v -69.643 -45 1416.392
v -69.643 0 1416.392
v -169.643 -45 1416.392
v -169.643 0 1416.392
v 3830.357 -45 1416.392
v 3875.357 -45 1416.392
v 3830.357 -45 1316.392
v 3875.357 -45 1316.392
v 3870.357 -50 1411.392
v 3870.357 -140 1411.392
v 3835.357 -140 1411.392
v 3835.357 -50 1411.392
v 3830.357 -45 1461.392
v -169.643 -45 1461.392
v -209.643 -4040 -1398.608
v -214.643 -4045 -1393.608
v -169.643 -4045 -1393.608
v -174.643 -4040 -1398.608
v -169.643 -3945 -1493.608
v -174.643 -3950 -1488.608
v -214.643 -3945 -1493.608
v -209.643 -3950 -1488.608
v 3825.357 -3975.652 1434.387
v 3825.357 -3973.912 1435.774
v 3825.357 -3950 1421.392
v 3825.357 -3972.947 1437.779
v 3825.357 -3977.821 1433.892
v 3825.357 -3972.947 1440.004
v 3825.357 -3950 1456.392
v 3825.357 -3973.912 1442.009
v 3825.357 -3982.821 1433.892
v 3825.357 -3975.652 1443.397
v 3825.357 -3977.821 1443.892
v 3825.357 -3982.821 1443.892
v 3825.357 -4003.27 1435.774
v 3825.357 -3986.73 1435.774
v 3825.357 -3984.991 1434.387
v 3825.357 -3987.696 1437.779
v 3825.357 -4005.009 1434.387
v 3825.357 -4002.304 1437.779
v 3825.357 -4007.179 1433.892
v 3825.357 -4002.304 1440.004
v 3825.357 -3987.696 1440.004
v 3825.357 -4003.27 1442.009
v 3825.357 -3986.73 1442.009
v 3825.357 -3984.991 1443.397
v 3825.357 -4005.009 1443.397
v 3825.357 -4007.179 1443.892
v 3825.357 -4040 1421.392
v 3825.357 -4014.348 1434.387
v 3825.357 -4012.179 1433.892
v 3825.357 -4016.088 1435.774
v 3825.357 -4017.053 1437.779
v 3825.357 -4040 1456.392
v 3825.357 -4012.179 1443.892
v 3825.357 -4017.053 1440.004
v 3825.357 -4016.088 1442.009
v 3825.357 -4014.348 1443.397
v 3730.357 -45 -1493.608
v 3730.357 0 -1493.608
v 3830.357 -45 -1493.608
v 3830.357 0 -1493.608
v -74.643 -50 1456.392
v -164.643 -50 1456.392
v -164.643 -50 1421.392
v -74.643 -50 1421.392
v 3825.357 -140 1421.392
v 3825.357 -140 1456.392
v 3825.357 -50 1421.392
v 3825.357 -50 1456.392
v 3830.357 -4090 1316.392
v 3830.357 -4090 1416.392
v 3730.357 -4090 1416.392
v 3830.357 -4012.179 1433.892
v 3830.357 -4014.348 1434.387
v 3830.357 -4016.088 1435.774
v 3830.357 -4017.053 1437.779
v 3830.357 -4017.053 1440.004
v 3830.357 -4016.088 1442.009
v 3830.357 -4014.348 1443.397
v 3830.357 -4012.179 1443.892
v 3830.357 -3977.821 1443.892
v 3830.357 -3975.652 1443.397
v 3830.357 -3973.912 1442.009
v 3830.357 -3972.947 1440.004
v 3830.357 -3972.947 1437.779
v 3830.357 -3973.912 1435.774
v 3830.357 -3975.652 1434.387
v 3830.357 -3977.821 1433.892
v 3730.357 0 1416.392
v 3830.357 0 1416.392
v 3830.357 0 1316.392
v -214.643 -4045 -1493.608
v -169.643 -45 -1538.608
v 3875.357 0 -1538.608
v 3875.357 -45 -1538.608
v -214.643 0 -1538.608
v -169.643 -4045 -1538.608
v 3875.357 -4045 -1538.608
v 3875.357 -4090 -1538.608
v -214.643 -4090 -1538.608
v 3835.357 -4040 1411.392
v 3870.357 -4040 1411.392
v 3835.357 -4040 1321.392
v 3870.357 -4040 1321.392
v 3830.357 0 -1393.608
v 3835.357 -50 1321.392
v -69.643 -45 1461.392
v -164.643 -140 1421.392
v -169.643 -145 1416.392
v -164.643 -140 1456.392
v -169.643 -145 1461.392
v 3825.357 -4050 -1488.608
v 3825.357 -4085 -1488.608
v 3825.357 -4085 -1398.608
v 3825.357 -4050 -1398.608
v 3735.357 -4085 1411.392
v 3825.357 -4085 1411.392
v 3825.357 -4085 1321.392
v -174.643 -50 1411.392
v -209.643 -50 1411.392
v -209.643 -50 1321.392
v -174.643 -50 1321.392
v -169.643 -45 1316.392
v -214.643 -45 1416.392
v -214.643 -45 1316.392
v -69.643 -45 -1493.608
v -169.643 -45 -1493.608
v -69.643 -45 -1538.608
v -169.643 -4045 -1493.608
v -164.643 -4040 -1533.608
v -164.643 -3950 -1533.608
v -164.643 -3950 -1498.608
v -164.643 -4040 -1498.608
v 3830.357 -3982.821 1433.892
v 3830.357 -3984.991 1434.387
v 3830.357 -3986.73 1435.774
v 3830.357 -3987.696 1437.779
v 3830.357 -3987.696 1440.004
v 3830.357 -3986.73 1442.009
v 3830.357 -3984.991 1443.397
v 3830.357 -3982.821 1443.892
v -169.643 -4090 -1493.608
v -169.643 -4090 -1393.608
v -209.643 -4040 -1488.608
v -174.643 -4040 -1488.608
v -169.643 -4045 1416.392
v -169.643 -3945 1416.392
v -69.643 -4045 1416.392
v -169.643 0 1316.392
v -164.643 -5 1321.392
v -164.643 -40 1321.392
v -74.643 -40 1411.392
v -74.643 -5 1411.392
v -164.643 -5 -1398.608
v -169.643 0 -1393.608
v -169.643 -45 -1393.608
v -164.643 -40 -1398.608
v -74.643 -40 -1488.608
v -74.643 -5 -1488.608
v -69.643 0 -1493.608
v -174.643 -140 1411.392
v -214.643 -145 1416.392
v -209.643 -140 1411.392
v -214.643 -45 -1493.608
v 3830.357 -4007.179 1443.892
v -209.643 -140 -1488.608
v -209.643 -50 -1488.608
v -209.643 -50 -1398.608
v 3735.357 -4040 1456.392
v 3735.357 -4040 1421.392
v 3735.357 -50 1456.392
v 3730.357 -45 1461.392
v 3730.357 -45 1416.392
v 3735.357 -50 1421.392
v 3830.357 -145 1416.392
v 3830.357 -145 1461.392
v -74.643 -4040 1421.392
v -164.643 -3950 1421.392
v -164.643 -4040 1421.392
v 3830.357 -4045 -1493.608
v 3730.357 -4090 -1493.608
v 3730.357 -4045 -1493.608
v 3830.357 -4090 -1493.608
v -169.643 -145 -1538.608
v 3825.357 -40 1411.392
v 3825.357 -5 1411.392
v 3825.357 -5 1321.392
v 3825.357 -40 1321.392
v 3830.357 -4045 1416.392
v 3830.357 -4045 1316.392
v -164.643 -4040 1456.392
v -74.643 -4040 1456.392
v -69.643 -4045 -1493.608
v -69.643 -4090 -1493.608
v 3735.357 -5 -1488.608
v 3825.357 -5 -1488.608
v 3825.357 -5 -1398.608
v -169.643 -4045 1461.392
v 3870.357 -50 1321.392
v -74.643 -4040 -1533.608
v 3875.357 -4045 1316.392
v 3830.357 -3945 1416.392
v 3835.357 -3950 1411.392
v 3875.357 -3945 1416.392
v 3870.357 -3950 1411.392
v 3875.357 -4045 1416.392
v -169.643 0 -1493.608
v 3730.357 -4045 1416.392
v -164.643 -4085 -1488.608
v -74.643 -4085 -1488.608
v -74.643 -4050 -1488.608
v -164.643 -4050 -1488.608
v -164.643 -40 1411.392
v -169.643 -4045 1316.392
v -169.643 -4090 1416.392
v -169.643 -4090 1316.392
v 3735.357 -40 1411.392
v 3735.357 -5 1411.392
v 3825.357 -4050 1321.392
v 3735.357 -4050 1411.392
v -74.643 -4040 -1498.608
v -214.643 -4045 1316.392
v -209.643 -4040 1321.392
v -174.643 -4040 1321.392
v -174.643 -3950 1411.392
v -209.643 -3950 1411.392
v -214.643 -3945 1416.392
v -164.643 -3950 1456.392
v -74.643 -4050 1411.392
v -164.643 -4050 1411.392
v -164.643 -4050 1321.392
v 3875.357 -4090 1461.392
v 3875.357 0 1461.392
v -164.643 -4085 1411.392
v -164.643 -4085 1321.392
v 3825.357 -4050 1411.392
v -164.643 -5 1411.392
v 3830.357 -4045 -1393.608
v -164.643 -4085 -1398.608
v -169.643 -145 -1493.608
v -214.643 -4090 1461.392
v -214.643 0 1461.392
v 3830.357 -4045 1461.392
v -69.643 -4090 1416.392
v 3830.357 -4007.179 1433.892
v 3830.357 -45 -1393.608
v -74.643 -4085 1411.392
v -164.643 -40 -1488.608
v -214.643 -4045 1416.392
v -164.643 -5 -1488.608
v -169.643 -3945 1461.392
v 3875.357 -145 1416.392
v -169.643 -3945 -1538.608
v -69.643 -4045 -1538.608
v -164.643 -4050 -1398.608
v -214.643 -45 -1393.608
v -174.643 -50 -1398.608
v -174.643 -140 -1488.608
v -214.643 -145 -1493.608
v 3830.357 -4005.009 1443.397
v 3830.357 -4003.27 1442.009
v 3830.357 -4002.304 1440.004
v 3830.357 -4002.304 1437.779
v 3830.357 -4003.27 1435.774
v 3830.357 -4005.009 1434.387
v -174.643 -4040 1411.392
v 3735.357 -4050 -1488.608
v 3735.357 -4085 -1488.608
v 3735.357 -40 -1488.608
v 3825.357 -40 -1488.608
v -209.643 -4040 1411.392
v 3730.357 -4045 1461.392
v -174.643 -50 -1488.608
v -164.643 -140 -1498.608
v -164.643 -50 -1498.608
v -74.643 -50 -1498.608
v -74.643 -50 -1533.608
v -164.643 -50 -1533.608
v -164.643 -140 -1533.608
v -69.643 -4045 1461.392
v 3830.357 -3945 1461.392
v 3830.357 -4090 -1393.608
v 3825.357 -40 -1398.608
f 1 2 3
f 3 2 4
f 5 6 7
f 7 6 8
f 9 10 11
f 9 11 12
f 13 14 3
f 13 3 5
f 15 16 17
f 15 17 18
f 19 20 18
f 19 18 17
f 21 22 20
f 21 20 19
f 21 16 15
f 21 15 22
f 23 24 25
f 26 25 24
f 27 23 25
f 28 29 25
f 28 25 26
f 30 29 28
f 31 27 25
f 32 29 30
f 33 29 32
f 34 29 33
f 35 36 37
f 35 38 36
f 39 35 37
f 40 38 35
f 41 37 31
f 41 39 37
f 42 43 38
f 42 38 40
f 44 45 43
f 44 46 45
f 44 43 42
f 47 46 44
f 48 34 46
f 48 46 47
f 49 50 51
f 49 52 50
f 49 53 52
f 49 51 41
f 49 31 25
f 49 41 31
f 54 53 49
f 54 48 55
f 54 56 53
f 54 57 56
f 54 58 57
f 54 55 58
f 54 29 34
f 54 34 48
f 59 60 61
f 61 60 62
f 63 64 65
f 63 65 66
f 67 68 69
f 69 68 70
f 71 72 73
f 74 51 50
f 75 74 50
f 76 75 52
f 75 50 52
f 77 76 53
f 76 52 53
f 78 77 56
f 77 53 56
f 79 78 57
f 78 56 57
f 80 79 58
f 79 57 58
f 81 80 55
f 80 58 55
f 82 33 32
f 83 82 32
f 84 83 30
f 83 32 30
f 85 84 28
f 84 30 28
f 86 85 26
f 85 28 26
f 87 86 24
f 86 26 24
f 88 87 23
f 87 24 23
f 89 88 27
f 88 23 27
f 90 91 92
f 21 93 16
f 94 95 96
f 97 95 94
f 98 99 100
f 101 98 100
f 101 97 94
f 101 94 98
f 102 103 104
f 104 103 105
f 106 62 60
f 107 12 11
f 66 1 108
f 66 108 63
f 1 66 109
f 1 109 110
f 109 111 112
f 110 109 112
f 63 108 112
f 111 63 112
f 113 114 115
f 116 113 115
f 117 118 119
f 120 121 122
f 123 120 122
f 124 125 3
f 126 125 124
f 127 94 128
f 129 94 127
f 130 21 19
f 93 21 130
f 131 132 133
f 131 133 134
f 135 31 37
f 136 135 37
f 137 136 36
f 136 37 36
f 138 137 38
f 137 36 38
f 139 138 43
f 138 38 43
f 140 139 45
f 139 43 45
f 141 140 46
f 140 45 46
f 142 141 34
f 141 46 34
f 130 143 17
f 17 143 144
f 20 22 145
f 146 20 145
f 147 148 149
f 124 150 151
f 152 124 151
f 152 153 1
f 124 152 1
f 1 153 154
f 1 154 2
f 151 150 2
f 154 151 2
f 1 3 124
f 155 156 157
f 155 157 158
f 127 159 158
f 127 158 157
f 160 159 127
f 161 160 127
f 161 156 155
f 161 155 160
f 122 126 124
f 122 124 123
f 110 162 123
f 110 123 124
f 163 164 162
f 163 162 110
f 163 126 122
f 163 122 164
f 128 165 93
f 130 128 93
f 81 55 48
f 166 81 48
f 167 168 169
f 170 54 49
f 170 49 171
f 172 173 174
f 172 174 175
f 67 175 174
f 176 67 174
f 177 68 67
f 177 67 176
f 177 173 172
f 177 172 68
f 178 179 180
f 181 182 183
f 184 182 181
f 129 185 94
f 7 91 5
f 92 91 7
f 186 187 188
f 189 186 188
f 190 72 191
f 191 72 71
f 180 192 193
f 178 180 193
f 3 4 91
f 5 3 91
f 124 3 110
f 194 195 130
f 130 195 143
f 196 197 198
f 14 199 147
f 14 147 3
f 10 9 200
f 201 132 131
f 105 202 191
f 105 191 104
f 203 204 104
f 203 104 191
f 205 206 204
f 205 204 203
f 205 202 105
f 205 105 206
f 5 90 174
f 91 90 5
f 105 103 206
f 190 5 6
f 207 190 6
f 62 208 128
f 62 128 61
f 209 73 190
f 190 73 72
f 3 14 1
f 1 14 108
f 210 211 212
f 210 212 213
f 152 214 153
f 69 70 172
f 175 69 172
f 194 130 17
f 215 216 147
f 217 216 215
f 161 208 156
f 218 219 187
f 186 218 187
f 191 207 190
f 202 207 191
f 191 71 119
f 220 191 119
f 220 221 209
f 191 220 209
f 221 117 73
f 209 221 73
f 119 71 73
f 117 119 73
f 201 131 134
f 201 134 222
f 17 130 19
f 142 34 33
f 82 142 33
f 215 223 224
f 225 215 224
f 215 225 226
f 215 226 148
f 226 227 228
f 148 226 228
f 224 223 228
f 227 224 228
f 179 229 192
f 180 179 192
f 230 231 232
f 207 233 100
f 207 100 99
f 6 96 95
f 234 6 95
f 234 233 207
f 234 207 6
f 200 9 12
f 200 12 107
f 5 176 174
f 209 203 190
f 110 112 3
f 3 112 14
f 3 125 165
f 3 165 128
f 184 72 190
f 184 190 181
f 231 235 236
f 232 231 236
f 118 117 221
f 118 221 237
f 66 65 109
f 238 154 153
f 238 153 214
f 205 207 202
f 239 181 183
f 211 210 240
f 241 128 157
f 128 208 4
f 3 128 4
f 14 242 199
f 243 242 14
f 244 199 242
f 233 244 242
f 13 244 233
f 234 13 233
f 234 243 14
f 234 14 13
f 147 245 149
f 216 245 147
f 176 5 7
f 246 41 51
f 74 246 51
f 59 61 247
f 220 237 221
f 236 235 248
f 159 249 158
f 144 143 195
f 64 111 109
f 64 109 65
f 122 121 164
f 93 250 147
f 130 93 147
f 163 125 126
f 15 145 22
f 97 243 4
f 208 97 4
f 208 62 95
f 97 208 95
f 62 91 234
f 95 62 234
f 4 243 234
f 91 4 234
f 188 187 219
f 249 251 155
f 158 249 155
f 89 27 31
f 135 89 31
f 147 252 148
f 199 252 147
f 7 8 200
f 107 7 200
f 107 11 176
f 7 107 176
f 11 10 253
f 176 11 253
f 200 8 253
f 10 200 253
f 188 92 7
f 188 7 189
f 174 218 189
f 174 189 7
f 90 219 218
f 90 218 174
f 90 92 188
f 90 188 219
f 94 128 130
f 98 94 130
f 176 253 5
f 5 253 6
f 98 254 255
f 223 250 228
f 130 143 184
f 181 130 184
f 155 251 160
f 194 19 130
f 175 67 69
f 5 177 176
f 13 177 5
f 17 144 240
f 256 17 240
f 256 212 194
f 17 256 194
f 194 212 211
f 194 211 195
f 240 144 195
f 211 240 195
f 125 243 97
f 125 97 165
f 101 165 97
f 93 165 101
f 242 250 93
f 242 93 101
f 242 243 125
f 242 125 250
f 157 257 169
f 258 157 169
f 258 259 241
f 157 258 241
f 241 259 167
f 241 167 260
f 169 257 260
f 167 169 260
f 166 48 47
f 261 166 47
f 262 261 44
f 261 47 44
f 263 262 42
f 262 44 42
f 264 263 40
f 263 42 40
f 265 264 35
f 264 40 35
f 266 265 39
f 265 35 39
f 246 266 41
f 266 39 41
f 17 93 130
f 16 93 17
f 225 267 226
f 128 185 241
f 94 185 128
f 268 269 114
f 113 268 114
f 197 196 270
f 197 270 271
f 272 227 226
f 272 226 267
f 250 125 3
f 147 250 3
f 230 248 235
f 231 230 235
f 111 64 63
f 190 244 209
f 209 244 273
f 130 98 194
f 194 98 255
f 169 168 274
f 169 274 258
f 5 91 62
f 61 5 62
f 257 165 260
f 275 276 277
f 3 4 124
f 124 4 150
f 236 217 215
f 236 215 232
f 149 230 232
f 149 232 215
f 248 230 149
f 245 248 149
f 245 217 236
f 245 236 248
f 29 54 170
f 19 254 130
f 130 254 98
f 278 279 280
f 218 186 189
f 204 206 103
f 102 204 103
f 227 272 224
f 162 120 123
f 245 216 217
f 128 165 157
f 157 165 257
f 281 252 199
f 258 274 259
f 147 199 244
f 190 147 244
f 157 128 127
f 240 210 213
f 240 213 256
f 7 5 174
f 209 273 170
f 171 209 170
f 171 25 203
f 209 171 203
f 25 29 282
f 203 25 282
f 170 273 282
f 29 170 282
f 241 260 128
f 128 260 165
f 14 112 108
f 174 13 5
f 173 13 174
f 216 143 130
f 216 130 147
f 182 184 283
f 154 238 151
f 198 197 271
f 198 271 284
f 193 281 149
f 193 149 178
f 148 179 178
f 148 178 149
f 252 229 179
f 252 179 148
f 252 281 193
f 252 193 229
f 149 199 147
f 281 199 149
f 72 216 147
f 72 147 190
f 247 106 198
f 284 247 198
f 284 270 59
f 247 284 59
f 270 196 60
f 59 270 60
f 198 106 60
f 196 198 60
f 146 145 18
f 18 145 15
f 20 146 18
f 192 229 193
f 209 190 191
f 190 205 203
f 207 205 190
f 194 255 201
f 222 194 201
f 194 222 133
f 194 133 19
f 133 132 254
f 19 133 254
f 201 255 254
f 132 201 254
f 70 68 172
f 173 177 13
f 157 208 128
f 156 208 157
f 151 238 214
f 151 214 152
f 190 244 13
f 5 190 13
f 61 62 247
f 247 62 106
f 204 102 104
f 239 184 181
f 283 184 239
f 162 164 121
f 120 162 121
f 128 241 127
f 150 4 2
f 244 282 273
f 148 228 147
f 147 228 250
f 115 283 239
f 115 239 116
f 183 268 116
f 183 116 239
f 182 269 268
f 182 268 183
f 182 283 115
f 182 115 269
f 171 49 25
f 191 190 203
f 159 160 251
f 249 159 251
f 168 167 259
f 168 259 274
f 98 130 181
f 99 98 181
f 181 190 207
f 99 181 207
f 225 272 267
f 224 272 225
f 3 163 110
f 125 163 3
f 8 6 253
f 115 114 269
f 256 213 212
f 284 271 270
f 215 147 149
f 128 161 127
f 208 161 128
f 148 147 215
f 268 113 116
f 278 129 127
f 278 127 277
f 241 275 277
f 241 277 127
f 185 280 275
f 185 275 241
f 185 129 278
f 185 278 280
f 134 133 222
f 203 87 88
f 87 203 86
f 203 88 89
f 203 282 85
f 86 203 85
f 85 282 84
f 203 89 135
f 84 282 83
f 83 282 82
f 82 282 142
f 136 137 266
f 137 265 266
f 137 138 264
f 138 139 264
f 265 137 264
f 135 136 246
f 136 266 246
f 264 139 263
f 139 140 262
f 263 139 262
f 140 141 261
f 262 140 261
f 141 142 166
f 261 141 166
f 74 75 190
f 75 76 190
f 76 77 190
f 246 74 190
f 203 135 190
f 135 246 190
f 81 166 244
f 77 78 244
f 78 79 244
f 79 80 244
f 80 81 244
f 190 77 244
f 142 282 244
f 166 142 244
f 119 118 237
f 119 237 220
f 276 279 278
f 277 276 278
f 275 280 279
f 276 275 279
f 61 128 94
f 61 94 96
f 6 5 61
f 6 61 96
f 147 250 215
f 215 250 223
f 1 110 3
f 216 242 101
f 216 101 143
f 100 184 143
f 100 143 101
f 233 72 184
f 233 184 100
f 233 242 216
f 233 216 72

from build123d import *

# Parameters (mm, degrees)
F0_W      = 4000
F0_H      = 45
F1_DEPTH  = 45
F4_W      = 45
F4_H      = 4000
F5_DEPTH  = 45
F6_W      = 4000
F6_H      = 45
F7_DEPTH  = 45
F9_DEPTH  = 45
F14_DEPTH = 45
F18_DEPTH = 45
F23_T     = -5
F23_2_T   = -5
F23_3_T   = -5
F23_4_T   = -5
F23_5_T   = -5
F23_6_T   = -5
F23_7_T   = -5
F23_8_T   = -5
F23_9_T   = -5
F23_10_T  = -5
F23_11_T  = -5
F23_12_T  = -5
F23_13_T  = -5
F23_14_T  = -5
F23_15_T  = -5
F23_16_T  = -5
F23_17_T  = -5
F23_18_T  = -5
F23_19_T  = -5
F23_20_T  = -5
F25_DEPTH = 25


with BuildPart() as f1:
    # F0 (on Front) → F1 (new body)
    with BuildSketch(Plane.XZ):
        Polygon((-169.6427954237, 1461.3917125762), (-214.6427954237, 1461.3917125762), (-214.6427954237, -1538.6082874238), (-169.6427954237, -1538.6082874238), (-169.6427954237, -1493.6082874238), (-169.6427954237, 1416.3917125762), align=None)
        Polygon((3875.3572045763, 1461.3917125762), (3830.3572045763, 1461.3917125762), (3830.3572045763, 1416.3917125762), (3830.3572045763, -1493.6082874238), (3830.3572045763, -1538.6082874238), (3875.3572045763, -1538.6082874238), align=None)
        with Locations((1830.3572045763, 1438.8917125762)):
            Rectangle(F0_W, F0_H)
        with Locations((1830.3572045763, -1516.1082874238)):
            Rectangle(F0_W, F0_H)
    extrude(amount=F1_DEPTH)


with BuildPart() as f3_1:
    # F3: instance of F1
    add(f1.part.mirror(Plane(origin=(1830.3572045763, -2045, -38.6082874238), x_dir=(1, 0, 0), z_dir=(0, -1, 0))))


with BuildPart() as f1_1:
    add(f1.part)

    add(f3_1.part)  # F5 merges F3_1
    # F4 (on face) → F5 (join)
    with BuildSketch(Plane.XY.offset(1461.3917125762)):
        with Locations((3852.8572045763, -2045)):
            Rectangle(F4_W, F4_H)
        with Locations((-192.1427954237, -2045)):
            Rectangle(F4_W, F4_H)
    extrude(amount=-F5_DEPTH)

    # F6 (on face) → F7 (join)
    with BuildSketch(Plane(origin=(-214.6427954237, 0, 0), x_dir=(0, -1, 0), z_dir=(-1, 0, 0))):
        with Locations((2045, -1516.1082874238)):
            Rectangle(F6_W, F6_H)
    extrude(amount=-F7_DEPTH)


with BuildPart() as f9:
    # F8 (on face) → F9 (new body)
    with BuildSketch(Plane.YZ.offset(3875.3572045763)):
        Polygon((-4045, 1316.3917125762), (-3945, 1416.3917125762), (-4045, 1416.3917125762), align=None)
    extrude(amount=-F9_DEPTH)


with BuildPart() as f10_1:
    # F10: instance of F9
    add(f9.part.mirror(Plane(origin=(1830.3572045763, -2045, -38.6082874238), x_dir=(1, 0, 0), z_dir=(0, -1, 0))))


with BuildPart() as f12_1:
    # F12: instance of F9
    add(f9.part.mirror(Plane(origin=(1830.3572045763, -2045, 1438.8917125762), x_dir=(0, -1, 0), z_dir=(-1, 0, 0))))


with BuildPart() as f12_2:
    # F12: instance of F10_1
    add(f10_1.part.mirror(Plane(origin=(1830.3572045763, -2045, 1438.8917125762), x_dir=(0, -1, 0), z_dir=(-1, 0, 0))))


with BuildPart() as f14:
    # F13 (on face) → F14 (new body)
    with BuildSketch(Plane(origin=(0, 0, 0), x_dir=(-1, 0, 0), z_dir=(0, 1, 0))):
        Polygon((-3730.3572045763, 1416.3917125762), (-3830.3572045763, 1416.3917125762), (-3830.3572045763, 1316.3917125762), align=None)
    extrude(amount=-F14_DEPTH)


with BuildPart() as f15_1:
    # F15: instance of F14
    add(f14.part.mirror(Plane(origin=(1830.3572045763, -2045, 1438.8917125762), x_dir=(0, -1, 0), z_dir=(-1, 0, 0))))


with BuildPart() as f16_1:
    # F16: instance of F14
    add(f14.part.mirror(Plane(origin=(1830.3572045763, -2045, -38.6082874238), x_dir=(1, 0, 0), z_dir=(0, -1, 0))))


with BuildPart() as f16_2:
    # F16: instance of F15_1
    add(f15_1.part.mirror(Plane(origin=(1830.3572045763, -2045, -38.6082874238), x_dir=(1, 0, 0), z_dir=(0, -1, 0))))


with BuildPart() as f18:
    # F17 (on face) → F18 (new body)
    with BuildSketch(Plane.XY.offset(1461.3917125762)):
        Polygon((-169.6427954237, -3945), (-169.6427954237, -4045), (-69.6427954237, -4045), align=None)
    extrude(amount=-F18_DEPTH)


with BuildPart() as f19_1:
    # F19: instance of F18
    add(f18.part.mirror(Plane(origin=(1830.3572045763, -2045, 1438.8917125762), x_dir=(0, -1, 0), z_dir=(-1, 0, 0))))


with BuildPart() as f20_1:
    # F20: instance of F18
    add(f18.part.mirror(Plane(origin=(1830.3572045763, -2045, -38.6082874238), x_dir=(1, 0, 0), z_dir=(0, -1, 0))))


with BuildPart() as f20_2:
    # F20: instance of F19_1
    add(f19_1.part.mirror(Plane(origin=(1830.3572045763, -2045, -38.6082874238), x_dir=(1, 0, 0), z_dir=(0, -1, 0))))

    # F23#7
    f23_7_openings = [f20_2.faces().sort_by_distance(p)[0] for p in [
        (3780.357205, -95, 1438.891713),
    ]]
    offset(amount=F23_7_T, openings=f23_7_openings)


with BuildPart() as f22_1:
    # F22: instance of F14
    add(f14.part.mirror(Plane(origin=(1830.3572045763, -22.5, -38.6082874238), x_dir=(1, 0, 0), z_dir=(0, 0, -1))))

    # F23#16
    f23_16_openings = [f22_1.faces().sort_by_distance(p)[0] for p in [
        (3780.357205, -22.5, -1443.608287),
    ]]
    offset(amount=F23_16_T, openings=f23_16_openings)


with BuildPart() as f22_2:
    # F22: instance of F15_1
    add(f15_1.part.mirror(Plane(origin=(1830.3572045763, -22.5, -38.6082874238), x_dir=(1, 0, 0), z_dir=(0, 0, -1))))

    # F23#2
    f23_2_openings = [f22_2.faces().sort_by_distance(p)[0] for p in [
        (-119.642795, -22.5, -1443.608287),
    ]]
    offset(amount=F23_2_T, openings=f23_2_openings)


with BuildPart() as f22_3:
    # F22: instance of F16_1
    add(f16_1.part.mirror(Plane(origin=(1830.3572045763, -22.5, -38.6082874238), x_dir=(1, 0, 0), z_dir=(0, 0, -1))))

    # F23#17
    f23_17_openings = [f22_3.faces().sort_by_distance(p)[0] for p in [
        (3780.357205, -4067.5, -1443.608287),
    ]]
    offset(amount=F23_17_T, openings=f23_17_openings)


with BuildPart() as f22_4:
    # F22: instance of F16_2
    add(f16_2.part.mirror(Plane(origin=(1830.3572045763, -22.5, -38.6082874238), x_dir=(1, 0, 0), z_dir=(0, 0, -1))))

    # F23#18
    f23_18_openings = [f22_4.faces().sort_by_distance(p)[0] for p in [
        (-119.642795, -4067.5, -1443.608287),
    ]]
    offset(amount=F23_18_T, openings=f23_18_openings)


with BuildPart() as f22_5:
    # F22: instance of F12_2
    add(f12_2.part.mirror(Plane(origin=(1830.3572045763, -22.5, -38.6082874238), x_dir=(1, 0, 0), z_dir=(0, 0, -1))))

    # F23
    f23_openings = [f22_5.faces().sort_by_distance(p)[0] for p in [
        (-192.142795, -95, -1443.608287),
    ]]
    offset(amount=F23_T, openings=f23_openings)


with BuildPart() as f22_6:
    # F22: instance of F12_1
    add(f12_1.part.mirror(Plane(origin=(1830.3572045763, -22.5, -38.6082874238), x_dir=(1, 0, 0), z_dir=(0, 0, -1))))

    # F23#20
    f23_20_openings = [f22_6.faces().sort_by_distance(p)[0] for p in [
        (-192.142795, -3995, -1443.608287),
    ]]
    offset(amount=F23_20_T, openings=f23_20_openings)


with BuildPart() as f22_7:
    # F22: instance of F20_1
    add(f20_1.part.mirror(Plane(origin=(1830.3572045763, -22.5, -38.6082874238), x_dir=(1, 0, 0), z_dir=(0, 0, -1))))

    # F23#3
    f23_3_openings = [f22_7.faces().sort_by_distance(p)[0] for p in [
        (-119.642795, -95, -1516.108287),
    ]]
    offset(amount=F23_3_T, openings=f23_3_openings)


with BuildPart() as f22_8:
    # F22: instance of F18
    add(f18.part.mirror(Plane(origin=(1830.3572045763, -22.5, -38.6082874238), x_dir=(1, 0, 0), z_dir=(0, 0, -1))))

    # F23#19
    f23_19_openings = [f22_8.faces().sort_by_distance(p)[0] for p in [
        (-119.642795, -3995, -1516.108287),
    ]]
    offset(amount=F23_19_T, openings=f23_19_openings)


with BuildPart() as f20_1_1:
    add(f20_1.part)

    # F23#4
    f23_4_openings = [f20_1_1.faces().sort_by_distance(p)[0] for p in [
        (-119.642795, -95, 1438.891713),
    ]]
    offset(amount=F23_4_T, openings=f23_4_openings)


with BuildPart() as f12_2_1:
    add(f12_2.part)

    # F23#5
    f23_5_openings = [f12_2_1.faces().sort_by_distance(p)[0] for p in [
        (-192.142795, -95, 1366.391713),
    ]]
    offset(amount=F23_5_T, openings=f23_5_openings)


with BuildPart() as f15_1_1:
    add(f15_1.part)

    # F23#6
    f23_6_openings = [f15_1_1.faces().sort_by_distance(p)[0] for p in [
        (-119.642795, -22.5, 1366.391713),
    ]]
    offset(amount=F23_6_T, openings=f23_6_openings)


with BuildPart() as f10_1_1:
    add(f10_1.part)

    # F23#8
    f23_8_openings = [f10_1_1.faces().sort_by_distance(p)[0] for p in [
        (3852.857205, -95, 1366.391713),
    ]]
    offset(amount=F23_8_T, openings=f23_8_openings)


with BuildPart() as f14_1:
    add(f14.part)

    # F23#9
    f23_9_openings = [f14_1.faces().sort_by_distance(p)[0] for p in [
        (3780.357205, -22.5, 1366.391713),
    ]]
    offset(amount=F23_9_T, openings=f23_9_openings)


with BuildPart() as f19_1_1:
    add(f19_1.part)

    # F23#10
    f23_10_openings = [f19_1_1.faces().sort_by_distance(p)[0] for p in [
        (3780.357205, -3995, 1438.891713),
    ]]
    offset(amount=F23_10_T, openings=f23_10_openings)

    # F24 (on face) → F25 (cut)
    with BuildSketch(Plane(origin=(3825.3572045763, 0, 0), x_dir=(0, -1, 0), z_dir=(-1, 0, 0))):
        with BuildLine():
            Line((3982.8212277441, 1443.8917125762), (3977.8212277441, 1443.8917125762))
            ThreePointArc((3977.8212277441, 1443.8917125762), (3972.8212277441, 1438.8917125762), (3977.8212277441, 1433.8917125762))
            Line((3977.8212277441, 1433.8917125762), (3982.8212277441, 1433.8917125762))
            ThreePointArc((3982.8212277441, 1433.8917125762), (3987.8212277441, 1438.8917125762), (3982.8212277441, 1443.8917125762))
        make_face()
        with BuildLine():
            ThreePointArc((4007.1787722559, 1443.8917125762), (4002.1787722559, 1438.8917125762), (4007.1787722559, 1433.8917125762))
            Line((4007.1787722559, 1433.8917125762), (4012.1787722559, 1433.8917125762))
            ThreePointArc((4012.1787722559, 1433.8917125762), (4017.1787722559, 1438.8917125762), (4012.1787722559, 1443.8917125762))
            Line((4012.1787722559, 1443.8917125762), (4007.1787722559, 1443.8917125762))
        make_face()
    extrude(amount=-F25_DEPTH, mode=Mode.SUBTRACT)


with BuildPart() as f9_1:
    add(f9.part)

    # F23#11
    f23_11_openings = [f9_1.faces().sort_by_distance(p)[0] for p in [
        (3852.857205, -3995, 1366.391713),
    ]]
    offset(amount=F23_11_T, openings=f23_11_openings)


with BuildPart() as f16_1_1:
    add(f16_1.part)

    # F23#12
    f23_12_openings = [f16_1_1.faces().sort_by_distance(p)[0] for p in [
        (3780.357205, -4067.5, 1366.391713),
    ]]
    offset(amount=F23_12_T, openings=f23_12_openings)


with BuildPart() as f18_1:
    add(f18.part)

    # F23#13
    f23_13_openings = [f18_1.faces().sort_by_distance(p)[0] for p in [
        (-119.642795, -3995, 1438.891713),
    ]]
    offset(amount=F23_13_T, openings=f23_13_openings)


with BuildPart() as f16_2_1:
    add(f16_2.part)

    # F23#14
    f23_14_openings = [f16_2_1.faces().sort_by_distance(p)[0] for p in [
        (-119.642795, -4067.5, 1366.391713),
    ]]
    offset(amount=F23_14_T, openings=f23_14_openings)


with BuildPart() as f12_1_1:
    add(f12_1.part)

    # F23#15
    f23_15_openings = [f12_1_1.faces().sort_by_distance(p)[0] for p in [
        (-192.142795, -3995, 1366.391713),
    ]]
    offset(amount=F23_15_T, openings=f23_15_openings)


solid = Compound([f1_1.part, f20_2.part, f22_1.part, f22_2.part, f22_3.part, f22_4.part, f22_5.part, f22_6.part, f22_7.part, f22_8.part, f20_1_1.part, f12_2_1.part, f15_1_1.part, f10_1_1.part, f14_1.part, f19_1_1.part, f9_1.part, f16_1_1.part, f18_1.part, f16_2_1.part, f12_1_1.part])
